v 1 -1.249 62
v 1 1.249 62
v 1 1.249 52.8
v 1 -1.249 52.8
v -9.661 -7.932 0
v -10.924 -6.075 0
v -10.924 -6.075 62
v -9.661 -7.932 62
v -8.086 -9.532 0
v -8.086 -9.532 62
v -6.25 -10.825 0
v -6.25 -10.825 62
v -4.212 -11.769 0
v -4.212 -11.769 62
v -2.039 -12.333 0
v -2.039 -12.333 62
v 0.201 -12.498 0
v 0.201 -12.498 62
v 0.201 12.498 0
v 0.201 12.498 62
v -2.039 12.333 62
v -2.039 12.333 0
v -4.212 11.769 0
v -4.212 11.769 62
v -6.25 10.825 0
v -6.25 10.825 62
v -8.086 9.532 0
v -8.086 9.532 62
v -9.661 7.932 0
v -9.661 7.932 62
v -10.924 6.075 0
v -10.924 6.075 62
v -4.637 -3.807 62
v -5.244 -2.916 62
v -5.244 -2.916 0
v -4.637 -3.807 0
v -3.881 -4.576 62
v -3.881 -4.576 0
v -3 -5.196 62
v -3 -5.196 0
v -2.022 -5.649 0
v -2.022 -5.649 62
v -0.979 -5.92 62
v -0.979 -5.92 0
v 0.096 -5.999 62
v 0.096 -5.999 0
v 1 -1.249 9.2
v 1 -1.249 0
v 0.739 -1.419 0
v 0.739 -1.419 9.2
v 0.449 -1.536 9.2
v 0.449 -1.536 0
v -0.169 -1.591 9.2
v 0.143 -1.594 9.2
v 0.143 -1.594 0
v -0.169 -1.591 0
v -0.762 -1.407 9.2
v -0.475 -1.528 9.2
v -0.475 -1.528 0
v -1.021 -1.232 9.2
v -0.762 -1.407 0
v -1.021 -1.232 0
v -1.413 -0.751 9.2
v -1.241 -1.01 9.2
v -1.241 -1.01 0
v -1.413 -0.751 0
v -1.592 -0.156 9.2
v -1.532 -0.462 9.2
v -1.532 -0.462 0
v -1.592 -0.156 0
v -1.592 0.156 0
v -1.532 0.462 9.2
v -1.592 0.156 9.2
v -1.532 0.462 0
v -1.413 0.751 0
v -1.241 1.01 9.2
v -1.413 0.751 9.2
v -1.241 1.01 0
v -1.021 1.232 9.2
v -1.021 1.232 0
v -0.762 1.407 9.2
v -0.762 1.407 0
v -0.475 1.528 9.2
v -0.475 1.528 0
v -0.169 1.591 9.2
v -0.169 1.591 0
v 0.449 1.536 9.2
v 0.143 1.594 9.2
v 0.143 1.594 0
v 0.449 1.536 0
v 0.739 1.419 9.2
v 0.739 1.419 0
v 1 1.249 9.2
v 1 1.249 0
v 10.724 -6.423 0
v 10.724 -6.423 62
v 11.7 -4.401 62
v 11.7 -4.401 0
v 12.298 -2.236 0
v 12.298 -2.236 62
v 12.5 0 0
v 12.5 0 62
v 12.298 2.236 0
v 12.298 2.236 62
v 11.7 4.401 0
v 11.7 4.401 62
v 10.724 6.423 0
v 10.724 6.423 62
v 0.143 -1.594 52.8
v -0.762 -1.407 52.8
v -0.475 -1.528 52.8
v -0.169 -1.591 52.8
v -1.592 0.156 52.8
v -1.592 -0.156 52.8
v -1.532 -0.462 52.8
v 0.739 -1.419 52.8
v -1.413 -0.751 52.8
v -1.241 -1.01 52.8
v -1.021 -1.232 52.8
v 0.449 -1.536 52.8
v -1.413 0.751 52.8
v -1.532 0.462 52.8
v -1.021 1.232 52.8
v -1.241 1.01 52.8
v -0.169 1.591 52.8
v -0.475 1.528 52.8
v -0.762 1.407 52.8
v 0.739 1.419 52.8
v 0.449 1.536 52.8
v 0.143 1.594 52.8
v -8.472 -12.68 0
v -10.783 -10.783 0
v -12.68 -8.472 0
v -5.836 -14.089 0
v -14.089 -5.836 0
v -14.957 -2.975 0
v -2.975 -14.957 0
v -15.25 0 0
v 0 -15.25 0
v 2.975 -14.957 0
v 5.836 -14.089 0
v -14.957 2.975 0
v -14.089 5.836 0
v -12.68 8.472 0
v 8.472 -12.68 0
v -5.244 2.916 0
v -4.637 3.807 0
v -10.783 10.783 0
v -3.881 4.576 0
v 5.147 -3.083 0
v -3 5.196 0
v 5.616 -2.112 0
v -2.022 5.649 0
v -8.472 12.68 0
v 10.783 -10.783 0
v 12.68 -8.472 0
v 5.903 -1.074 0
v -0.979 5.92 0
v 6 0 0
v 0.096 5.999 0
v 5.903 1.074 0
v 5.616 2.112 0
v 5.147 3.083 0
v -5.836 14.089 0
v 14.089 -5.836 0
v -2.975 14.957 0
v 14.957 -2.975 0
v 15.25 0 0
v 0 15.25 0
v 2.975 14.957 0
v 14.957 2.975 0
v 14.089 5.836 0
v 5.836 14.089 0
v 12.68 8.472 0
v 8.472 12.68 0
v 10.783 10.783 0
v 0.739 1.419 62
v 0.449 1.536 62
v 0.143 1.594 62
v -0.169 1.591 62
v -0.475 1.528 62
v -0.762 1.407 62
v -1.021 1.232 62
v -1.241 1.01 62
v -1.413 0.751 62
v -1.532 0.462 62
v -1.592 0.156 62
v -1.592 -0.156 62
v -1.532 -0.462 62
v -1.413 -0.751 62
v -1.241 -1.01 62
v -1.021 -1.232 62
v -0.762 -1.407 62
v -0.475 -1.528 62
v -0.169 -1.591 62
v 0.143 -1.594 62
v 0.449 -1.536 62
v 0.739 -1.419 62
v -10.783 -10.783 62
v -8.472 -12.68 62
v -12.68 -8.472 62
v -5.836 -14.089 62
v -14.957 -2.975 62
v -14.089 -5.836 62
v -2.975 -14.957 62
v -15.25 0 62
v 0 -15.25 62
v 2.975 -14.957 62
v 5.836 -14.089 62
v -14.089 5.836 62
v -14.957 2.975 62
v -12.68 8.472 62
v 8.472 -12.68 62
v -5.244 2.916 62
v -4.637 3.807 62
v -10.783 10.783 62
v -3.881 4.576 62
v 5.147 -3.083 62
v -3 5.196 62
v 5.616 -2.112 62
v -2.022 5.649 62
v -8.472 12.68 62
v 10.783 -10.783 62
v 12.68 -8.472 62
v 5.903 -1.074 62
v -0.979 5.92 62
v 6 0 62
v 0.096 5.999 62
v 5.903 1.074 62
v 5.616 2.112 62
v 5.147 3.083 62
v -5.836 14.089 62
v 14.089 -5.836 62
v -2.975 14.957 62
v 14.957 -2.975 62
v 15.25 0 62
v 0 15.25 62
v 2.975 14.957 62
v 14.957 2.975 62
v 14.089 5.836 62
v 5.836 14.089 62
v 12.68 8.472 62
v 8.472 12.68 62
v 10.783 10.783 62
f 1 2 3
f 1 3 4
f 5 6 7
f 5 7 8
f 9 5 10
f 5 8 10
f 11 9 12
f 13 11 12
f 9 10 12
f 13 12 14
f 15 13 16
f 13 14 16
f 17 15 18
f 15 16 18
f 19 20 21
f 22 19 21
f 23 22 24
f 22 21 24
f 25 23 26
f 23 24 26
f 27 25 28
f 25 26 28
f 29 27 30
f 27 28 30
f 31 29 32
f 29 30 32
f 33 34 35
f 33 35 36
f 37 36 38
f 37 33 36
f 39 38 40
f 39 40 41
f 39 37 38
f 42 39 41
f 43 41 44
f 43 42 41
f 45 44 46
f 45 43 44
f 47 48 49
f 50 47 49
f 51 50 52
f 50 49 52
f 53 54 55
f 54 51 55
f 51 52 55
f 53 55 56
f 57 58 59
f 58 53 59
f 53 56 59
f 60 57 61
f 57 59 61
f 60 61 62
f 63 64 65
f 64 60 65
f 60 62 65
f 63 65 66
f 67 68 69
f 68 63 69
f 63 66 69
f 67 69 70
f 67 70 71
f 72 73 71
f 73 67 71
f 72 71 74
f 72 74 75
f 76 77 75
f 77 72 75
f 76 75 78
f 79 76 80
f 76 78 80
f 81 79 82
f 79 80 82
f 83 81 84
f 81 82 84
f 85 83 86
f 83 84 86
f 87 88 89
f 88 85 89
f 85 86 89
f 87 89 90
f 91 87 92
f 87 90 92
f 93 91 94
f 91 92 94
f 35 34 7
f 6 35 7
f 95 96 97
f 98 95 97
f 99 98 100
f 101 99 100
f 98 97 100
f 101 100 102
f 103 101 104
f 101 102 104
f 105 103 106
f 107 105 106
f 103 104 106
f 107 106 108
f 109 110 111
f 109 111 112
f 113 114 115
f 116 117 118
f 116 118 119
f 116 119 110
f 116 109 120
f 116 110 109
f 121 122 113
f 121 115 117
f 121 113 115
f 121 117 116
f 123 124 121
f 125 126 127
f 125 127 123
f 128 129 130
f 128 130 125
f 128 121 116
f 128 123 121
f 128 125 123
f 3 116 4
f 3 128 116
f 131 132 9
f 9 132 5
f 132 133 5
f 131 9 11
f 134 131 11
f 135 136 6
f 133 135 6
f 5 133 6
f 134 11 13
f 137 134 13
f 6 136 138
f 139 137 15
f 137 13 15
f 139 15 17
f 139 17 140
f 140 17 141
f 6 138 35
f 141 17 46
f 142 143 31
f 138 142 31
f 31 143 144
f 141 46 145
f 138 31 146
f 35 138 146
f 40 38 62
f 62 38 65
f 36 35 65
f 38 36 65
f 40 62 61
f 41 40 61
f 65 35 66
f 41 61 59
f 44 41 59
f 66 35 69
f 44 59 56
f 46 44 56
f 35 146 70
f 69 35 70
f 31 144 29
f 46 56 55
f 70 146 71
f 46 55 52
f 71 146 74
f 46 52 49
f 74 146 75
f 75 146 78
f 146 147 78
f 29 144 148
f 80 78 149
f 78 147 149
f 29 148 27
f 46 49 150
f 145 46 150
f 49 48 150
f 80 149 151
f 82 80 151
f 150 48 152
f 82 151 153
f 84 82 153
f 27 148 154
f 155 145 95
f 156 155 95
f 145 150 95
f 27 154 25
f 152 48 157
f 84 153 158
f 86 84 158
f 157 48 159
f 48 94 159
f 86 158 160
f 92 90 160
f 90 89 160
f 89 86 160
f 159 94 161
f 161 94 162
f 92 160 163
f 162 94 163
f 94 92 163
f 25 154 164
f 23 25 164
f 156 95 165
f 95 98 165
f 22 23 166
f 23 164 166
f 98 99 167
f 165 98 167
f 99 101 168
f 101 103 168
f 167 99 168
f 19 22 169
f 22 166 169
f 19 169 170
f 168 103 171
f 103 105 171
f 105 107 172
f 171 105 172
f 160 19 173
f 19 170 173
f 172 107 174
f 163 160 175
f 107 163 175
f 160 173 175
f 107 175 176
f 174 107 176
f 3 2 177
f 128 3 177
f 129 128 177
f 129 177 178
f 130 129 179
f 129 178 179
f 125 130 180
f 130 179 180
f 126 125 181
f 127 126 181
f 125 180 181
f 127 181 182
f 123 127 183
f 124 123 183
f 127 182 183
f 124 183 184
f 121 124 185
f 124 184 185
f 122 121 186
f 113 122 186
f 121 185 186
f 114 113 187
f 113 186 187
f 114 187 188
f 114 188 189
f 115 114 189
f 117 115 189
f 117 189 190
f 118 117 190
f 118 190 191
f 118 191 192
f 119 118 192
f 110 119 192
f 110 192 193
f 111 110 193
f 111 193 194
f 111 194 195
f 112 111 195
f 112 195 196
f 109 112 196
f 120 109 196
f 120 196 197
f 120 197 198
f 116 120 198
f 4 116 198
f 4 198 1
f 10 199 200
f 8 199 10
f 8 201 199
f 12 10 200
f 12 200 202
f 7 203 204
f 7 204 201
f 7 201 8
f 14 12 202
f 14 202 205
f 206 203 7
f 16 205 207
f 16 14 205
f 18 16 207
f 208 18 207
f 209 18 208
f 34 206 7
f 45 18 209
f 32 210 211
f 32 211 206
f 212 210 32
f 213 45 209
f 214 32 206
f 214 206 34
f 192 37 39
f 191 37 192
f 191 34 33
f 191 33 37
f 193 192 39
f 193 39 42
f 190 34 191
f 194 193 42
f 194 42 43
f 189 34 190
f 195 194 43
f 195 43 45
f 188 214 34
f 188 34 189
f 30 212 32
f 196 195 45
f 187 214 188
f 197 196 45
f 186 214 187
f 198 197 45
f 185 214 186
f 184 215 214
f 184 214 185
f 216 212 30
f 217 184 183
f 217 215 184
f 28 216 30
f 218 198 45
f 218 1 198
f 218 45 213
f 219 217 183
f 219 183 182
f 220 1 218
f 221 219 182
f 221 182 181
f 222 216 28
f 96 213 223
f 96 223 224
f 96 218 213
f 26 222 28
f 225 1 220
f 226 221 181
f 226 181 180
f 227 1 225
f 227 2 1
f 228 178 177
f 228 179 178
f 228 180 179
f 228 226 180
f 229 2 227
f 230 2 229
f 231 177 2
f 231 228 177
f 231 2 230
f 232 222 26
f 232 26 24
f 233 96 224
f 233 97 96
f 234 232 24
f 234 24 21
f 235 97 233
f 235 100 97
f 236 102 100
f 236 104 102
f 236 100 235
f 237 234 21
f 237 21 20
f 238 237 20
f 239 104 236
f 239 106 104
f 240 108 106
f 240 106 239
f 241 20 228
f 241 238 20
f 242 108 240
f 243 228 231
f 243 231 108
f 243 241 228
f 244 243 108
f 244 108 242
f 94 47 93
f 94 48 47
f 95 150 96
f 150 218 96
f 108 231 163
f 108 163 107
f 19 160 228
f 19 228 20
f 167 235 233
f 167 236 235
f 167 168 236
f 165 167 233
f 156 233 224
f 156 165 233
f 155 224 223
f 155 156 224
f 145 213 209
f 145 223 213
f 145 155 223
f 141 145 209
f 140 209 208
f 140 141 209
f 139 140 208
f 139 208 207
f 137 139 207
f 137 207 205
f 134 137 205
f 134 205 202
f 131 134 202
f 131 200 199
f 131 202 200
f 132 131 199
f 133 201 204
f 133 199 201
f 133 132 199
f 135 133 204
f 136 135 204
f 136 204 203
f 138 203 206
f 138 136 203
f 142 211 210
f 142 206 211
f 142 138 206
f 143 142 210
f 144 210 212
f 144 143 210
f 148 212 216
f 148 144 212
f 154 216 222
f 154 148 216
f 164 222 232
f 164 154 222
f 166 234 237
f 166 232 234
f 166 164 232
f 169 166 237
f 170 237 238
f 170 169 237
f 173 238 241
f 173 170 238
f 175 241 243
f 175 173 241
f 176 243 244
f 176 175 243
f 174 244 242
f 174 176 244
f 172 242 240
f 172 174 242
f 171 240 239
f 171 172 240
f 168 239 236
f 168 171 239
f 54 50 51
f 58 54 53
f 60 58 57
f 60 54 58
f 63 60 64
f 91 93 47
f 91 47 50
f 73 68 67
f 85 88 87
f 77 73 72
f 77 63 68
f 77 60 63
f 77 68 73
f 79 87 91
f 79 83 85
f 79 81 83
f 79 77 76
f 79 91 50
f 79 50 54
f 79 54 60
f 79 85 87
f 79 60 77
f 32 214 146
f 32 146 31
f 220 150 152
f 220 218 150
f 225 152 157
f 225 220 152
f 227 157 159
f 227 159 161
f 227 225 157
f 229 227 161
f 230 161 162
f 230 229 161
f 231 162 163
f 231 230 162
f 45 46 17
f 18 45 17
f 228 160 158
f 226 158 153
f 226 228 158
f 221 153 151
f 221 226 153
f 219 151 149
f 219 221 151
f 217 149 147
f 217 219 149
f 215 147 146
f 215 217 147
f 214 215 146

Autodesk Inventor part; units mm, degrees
ref_plane "YZ Plane" through (0, 0, 0) normal (1, 0, 0) x (0, 1, 0)
ref_plane "XZ Plane" through (0, 0, 0) normal (0, 1, 0) x (-1, 0, 0)
sketch "草图1" plane through (0, 0, 0) normal (0, 0, 1) x (1, 0, 0)
  circle A0 centre (0, 0) radius 15.25
  dimension "d0" = 30.5
extrude "拉伸1" add sketch "草图1" along normal blind 62
sketch "草图2" plane through (0, 0, 62) normal (0, 0, 1) x (1, 0, 0)
  arc A0 (5.1473, -3.0831) -> (5.1473, 3.0831) centre (0, 0) ccw
  arc A1 (10.7235, -6.423) -> (10.7235, 6.423) centre (0, 0) ccw
  line L0 (5.1473, 3.0831) -> (10.7235, 6.423)
  line L1 (0, 0) -> (24.4496, 0) construction
  line L2 (5.1473, -3.0831) -> (10.7235, -6.423)
  line L3 (-5.2437, 2.9162) -> (-10.9243, 6.0753)
  arc A2 (0.0964, 5.9992) -> (-5.2437, 2.9162) centre (0, 0) ccw
  line L4 (0.0964, 5.9992) -> (0.2008, 12.4984)
  arc A3 (0.2008, 12.4984) -> (-10.9243, 6.0753) centre (0, 0) ccw
  line L5 (0.0964, -5.9992) -> (0.2008, -12.4984)
  arc A4 (-5.2437, -2.9162) -> (0.0964, -5.9992) centre (0, 0) ccw
  line L6 (-5.2437, -2.9162) -> (-10.9243, -6.0753)
  arc A5 (-10.9243, -6.0753) -> (0.2008, -12.4984) centre (0, 0) ccw
  dimension "d4" = 12
  dimension "d5" = 30.92
  dimension "d8" = 360
  dimension "d16" = 12.5
extrude "拉伸2" cut sketch "草图2" against normal through all
sketch "草图3" plane through (0, 0, 62) normal (0, 0, 1) x (1, 0, 0)
  arc A0 (1, 1.249) -> (1, -1.249) centre (0, 0) ccw
  line L0 (1, 1.249) -> (1, -1.249)
  line L1 (-1.6, 0) -> (-1.6, 2.5625) construction
  dimension "d12" = 3.2
  dimension "d13" = 2.6
extrude "拉伸3" cut sketch "草图3" against normal blind 9.2
ref_plane "工作平面1" through (0, 0, 31) normal (0, 0, 1) x (1, 0, 0)
mirror "镜像1" about plane through (0, 0, 31) normal (0, 0, 1) of "拉伸3"
properties part number "滚轮内轮" material "尼龙 6/6"
